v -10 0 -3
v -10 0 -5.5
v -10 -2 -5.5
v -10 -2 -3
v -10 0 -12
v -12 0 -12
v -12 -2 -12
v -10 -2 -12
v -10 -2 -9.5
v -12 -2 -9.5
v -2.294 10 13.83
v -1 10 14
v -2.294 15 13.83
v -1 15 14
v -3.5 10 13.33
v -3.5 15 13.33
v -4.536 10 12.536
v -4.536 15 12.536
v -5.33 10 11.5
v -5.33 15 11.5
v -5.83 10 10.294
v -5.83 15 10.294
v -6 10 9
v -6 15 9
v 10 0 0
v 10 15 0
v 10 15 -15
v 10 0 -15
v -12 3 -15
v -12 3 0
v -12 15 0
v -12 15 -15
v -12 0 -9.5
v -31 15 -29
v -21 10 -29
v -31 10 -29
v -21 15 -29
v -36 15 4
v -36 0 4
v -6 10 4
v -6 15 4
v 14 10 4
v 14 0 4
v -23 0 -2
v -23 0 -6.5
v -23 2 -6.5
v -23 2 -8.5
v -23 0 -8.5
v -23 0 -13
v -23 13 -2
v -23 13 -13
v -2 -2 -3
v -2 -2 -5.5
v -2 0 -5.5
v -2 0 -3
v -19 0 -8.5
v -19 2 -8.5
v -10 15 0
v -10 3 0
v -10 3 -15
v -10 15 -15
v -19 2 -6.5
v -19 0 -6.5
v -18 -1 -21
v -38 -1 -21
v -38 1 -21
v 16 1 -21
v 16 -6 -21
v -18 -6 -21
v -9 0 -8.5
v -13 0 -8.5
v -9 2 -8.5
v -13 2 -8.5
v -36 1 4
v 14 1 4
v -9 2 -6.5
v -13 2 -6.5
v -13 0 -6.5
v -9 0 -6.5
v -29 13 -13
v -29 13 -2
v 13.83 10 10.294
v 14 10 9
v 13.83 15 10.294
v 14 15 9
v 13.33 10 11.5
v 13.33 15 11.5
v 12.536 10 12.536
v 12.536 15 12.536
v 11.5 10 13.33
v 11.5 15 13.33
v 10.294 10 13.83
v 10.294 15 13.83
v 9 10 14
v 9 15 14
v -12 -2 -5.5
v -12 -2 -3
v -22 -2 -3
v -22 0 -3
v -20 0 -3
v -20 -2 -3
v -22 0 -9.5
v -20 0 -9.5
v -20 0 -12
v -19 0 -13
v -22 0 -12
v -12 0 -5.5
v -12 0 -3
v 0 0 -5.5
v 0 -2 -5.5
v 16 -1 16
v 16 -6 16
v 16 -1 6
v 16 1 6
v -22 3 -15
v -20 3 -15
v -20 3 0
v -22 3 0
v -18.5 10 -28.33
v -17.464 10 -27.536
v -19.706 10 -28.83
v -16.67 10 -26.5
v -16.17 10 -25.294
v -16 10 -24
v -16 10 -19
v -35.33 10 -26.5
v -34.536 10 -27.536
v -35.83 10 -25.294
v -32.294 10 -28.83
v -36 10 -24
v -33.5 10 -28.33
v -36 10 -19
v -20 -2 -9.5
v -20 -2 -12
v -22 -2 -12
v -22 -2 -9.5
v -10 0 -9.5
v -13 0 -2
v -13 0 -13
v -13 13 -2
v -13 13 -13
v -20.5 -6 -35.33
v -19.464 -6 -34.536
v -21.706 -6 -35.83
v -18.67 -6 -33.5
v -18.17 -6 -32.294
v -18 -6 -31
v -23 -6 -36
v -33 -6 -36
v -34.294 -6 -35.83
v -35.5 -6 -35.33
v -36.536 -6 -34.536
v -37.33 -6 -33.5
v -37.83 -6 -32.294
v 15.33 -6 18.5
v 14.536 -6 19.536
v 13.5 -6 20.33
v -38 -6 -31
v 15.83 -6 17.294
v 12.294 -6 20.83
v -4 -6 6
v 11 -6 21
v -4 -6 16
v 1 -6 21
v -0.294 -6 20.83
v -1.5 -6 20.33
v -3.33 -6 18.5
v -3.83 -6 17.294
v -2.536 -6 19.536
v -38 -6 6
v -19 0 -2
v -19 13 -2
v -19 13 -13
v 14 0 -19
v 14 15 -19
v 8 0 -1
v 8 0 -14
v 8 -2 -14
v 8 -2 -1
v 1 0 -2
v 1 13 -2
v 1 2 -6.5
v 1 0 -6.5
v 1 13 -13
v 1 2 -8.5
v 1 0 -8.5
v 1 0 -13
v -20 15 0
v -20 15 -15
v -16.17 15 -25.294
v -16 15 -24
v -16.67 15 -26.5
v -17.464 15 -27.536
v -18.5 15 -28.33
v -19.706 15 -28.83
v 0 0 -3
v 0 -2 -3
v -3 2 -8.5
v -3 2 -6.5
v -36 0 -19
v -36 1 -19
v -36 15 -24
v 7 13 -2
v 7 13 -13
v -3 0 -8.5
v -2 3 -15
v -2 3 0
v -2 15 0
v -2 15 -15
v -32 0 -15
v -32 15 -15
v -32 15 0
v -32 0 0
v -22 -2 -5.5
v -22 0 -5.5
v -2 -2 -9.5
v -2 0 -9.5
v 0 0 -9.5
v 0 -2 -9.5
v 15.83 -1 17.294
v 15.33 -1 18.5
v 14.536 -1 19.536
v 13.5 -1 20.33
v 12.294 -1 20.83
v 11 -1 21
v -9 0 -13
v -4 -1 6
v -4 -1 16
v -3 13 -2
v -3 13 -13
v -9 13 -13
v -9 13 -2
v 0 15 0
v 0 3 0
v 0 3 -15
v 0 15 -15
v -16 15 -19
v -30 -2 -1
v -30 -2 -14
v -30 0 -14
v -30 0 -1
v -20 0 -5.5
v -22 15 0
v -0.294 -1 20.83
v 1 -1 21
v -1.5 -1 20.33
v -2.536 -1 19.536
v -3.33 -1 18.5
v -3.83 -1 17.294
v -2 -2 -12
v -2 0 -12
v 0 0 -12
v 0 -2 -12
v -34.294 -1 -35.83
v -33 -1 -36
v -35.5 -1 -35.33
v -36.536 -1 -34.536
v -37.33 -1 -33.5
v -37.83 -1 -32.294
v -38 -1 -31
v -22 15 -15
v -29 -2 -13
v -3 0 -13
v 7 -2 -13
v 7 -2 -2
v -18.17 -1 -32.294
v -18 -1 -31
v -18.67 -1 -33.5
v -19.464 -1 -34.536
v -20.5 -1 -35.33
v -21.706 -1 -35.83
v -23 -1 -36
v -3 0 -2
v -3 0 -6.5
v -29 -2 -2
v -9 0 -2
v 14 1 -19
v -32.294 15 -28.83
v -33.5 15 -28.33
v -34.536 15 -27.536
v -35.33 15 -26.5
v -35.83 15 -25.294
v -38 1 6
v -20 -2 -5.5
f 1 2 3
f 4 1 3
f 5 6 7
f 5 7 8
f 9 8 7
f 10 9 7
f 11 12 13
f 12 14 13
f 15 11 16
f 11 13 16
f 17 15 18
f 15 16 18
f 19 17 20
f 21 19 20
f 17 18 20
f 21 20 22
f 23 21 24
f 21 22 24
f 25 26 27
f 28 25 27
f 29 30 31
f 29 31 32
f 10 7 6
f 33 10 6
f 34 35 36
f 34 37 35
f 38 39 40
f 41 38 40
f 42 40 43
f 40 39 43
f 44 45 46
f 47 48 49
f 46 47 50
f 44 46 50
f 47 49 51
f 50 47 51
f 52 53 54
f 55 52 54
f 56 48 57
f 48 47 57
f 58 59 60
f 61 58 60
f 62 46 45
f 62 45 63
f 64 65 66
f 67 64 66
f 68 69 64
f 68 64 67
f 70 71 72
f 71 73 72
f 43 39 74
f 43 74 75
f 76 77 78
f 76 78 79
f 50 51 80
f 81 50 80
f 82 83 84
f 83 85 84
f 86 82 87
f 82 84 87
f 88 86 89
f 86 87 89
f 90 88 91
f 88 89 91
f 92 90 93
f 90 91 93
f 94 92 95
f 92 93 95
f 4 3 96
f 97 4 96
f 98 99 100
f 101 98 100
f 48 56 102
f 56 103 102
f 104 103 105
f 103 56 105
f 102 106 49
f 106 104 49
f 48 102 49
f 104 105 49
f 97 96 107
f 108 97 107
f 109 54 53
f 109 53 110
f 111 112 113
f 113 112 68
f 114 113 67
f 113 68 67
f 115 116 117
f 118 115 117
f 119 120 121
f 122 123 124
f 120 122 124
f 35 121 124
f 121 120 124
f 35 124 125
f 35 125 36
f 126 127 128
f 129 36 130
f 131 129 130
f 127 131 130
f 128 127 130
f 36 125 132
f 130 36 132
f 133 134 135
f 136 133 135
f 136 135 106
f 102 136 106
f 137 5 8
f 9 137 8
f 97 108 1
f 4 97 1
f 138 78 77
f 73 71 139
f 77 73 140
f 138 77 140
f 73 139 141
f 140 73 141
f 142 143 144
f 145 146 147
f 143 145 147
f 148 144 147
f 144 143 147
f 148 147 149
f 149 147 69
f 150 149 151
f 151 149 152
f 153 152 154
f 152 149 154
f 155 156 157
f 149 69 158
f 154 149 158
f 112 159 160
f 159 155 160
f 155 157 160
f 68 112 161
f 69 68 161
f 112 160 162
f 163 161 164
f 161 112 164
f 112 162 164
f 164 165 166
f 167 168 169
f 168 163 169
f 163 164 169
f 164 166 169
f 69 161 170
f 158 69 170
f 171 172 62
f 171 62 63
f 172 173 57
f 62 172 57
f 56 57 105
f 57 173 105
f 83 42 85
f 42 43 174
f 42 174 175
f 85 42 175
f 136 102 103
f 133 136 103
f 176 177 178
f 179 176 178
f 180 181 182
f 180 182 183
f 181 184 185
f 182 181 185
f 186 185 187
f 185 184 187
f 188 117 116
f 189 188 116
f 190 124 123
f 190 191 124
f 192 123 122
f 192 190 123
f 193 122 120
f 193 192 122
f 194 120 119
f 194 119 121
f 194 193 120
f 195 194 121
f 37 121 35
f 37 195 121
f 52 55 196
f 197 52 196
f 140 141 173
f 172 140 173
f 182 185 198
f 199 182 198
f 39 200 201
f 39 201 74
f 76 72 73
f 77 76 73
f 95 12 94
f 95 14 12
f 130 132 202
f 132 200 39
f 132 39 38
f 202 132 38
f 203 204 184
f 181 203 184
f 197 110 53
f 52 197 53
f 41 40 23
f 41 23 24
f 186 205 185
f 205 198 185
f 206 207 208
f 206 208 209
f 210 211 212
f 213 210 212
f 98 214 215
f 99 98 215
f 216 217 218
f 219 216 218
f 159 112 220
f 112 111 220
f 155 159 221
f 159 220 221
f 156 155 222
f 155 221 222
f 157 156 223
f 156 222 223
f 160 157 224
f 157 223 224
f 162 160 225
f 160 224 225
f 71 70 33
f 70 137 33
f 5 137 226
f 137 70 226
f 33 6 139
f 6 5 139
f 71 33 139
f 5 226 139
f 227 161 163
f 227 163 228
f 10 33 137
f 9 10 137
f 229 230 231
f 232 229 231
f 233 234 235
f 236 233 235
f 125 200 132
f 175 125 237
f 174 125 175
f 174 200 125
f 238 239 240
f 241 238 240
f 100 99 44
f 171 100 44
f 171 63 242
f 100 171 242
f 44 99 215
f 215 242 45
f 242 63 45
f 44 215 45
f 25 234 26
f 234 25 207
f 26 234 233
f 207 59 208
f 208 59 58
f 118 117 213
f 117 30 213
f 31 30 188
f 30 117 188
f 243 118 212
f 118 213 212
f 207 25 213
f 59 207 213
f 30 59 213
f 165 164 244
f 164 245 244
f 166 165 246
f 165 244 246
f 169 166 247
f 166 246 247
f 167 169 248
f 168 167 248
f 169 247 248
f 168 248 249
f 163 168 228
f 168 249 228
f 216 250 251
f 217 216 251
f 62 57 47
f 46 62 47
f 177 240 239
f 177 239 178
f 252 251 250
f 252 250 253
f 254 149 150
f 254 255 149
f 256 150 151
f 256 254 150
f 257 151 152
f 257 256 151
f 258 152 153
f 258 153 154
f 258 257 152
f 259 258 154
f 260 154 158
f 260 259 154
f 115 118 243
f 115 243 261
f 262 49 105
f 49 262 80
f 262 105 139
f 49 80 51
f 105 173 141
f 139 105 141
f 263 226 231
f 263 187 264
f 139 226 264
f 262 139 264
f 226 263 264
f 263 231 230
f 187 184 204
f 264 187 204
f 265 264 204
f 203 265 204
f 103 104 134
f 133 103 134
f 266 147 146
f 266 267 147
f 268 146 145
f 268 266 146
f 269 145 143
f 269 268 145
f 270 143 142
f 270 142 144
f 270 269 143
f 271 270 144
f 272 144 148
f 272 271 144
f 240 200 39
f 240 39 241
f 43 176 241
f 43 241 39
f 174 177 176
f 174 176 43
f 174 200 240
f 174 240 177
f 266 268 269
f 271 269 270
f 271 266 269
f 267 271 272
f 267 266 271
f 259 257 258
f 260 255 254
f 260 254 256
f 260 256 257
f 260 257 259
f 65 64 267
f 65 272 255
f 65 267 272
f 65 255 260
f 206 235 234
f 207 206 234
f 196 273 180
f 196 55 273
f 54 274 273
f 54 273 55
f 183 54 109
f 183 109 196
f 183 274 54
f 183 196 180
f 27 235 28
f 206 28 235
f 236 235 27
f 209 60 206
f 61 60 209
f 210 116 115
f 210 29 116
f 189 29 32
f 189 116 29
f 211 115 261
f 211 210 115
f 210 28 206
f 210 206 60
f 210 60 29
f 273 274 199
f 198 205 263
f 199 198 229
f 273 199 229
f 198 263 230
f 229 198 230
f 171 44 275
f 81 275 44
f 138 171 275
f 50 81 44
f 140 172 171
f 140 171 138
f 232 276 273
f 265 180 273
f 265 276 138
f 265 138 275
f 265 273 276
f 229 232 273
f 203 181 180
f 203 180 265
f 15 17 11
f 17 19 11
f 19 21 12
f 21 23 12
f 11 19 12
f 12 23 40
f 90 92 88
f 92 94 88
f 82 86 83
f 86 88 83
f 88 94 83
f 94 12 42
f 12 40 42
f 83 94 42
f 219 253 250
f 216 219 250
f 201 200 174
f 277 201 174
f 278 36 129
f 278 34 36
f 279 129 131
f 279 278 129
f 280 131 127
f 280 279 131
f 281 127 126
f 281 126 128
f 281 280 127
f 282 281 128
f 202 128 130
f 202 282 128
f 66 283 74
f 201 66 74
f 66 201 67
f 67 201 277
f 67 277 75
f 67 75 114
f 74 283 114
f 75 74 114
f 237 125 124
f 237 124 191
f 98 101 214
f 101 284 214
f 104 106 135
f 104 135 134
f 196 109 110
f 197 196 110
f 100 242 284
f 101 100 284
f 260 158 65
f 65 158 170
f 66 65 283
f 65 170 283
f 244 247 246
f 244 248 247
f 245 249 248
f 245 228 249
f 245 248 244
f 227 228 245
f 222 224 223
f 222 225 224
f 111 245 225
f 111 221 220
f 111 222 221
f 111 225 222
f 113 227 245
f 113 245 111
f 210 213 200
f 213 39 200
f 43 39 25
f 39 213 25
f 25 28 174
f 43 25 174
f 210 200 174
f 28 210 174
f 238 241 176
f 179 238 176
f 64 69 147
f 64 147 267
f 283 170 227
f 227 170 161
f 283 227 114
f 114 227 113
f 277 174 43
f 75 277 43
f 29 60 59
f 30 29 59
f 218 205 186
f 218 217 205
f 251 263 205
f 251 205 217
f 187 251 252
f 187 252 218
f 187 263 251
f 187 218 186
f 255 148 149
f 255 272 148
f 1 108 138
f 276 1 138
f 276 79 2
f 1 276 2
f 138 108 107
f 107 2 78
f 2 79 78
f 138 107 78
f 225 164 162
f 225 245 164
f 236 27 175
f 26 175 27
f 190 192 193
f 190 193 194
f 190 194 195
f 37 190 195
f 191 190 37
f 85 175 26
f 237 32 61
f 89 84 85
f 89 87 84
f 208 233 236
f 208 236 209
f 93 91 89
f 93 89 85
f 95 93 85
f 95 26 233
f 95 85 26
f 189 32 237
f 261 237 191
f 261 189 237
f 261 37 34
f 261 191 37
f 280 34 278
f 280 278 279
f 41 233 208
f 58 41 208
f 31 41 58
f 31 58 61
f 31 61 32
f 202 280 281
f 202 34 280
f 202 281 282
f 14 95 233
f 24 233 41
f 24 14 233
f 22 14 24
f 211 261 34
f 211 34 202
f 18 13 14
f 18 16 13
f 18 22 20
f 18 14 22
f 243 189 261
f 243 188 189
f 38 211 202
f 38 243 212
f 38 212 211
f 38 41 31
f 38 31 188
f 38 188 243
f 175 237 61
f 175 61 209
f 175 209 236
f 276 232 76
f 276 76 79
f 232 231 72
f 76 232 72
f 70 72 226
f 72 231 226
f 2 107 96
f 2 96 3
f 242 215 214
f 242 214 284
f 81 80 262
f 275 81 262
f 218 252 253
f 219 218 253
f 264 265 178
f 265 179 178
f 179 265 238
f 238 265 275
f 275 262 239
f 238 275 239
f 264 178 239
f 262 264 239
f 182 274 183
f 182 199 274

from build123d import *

# Parameters (mm, degrees)
SKETCH1_W                = 8
SKETCH1_H                = 15
BOSS_EXTRUDE1_DEPTH      = 15
SKETCH2_W                = 6
SKETCH2_H                = 11
CUT_EXTRUDE1_DEPTH       = 13
SKETCH3_W                = 15
SKETCH3_H                = 3
BOSS_EXTRUDE2_DEPTH      = 2
LPATTERN1_COUNT          = 4
LPATTERN1_PITCH          = 10
SKETCH4_W                = 15
SKETCH4_H                = 12
BOSS_EXTRUDE3_DEPTH      = 2
SKETCH5_W                = 15
SKETCH5_H                = 15
BOSS_EXTRUDE4_DEPTH      = 2
SKETCH6_W                = 36
SKETCH6_H                = 2
CUT_EXTRUDE2_DEPTH       = 2
SKETCH7_W                = 38
SKETCH7_H                = 13
SKETCH7_W_2              = 36
SKETCH7_H_2              = 11
BOSS_EXTRUDE5_DEPTH      = 2
SKETCH8_W                = 2
SKETCH8_H                = 2.5
BOSS_EXTRUDE6_DEPTH      = 2
LPATTERN2_COUNT          = 3
LPATTERN2_PITCH          = 10
BOSS_EXTRUDE7_DEPTH      = 15
BOSS_EXTRUDE7_DEPTH_BACK = 6
SKETCH9_W                = 50
SKETCH9_H                = 23
SPLIT1_START             = -6
SPLIT1_OUTLINE_W         = 50
SPLIT1_OUTLINE_H         = 23
SPLIT1_DEPTH             = 6
SPLIT1_2_OUTLINE_W       = 6
SPLIT1_2_OUTLINE_H       = 11
SPLIT1_2_DEPTH           = 13
SPLIT1_3_OUTLINE_W       = 4
SPLIT1_3_OUTLINE_H       = 2
SPLIT1_3_DEPTH           = 2
SPLIT1_START_2           = -13
SPLIT1_4_DEPTH           = 11
SPLIT1_START_3           = -19
SPLIT1_5_DEPTH           = 23
SPLIT1_6_OUTLINE_W       = 38
SPLIT1_6_OUTLINE_H       = 2
SPLIT1_6_DEPTH           = 5
SPLIT1_START_4           = -1
SPLIT1_7_OUTLINE_W       = 38
SPLIT1_7_OUTLINE_H       = 2
SPLIT1_7_DEPTH           = 5
SPLIT1_START_5           = -8.5
SPLIT1_8_DEPTH           = 2
SPLIT1_START_6           = -9.5
SPLIT1_9_OUTLINE_W       = 2
SPLIT1_9_OUTLINE_H       = 2
SPLIT1_9_DEPTH           = 4
SPLIT1_10_OUTLINE_W      = 2
SPLIT1_10_OUTLINE_H      = 2
SPLIT1_10_DEPTH          = 1
SPLIT1_START_7           = -3
SPLIT1_11_OUTLINE_W      = 2
SPLIT1_11_OUTLINE_H      = 2
SPLIT1_11_DEPTH          = 1
SKETCH11_W               = 20
SKETCH11_H               = 5
BOSS_EXTRUDE8_DEPTH      = 10
SKETCH12_W               = 20
SKETCH12_H               = 5
BOSS_EXTRUDE9_DEPTH      = 10
FILLET1_R                = 5
SKETCH13_W               = 54
SKETCH13_H               = 27
SKETCH13_W_2             = 50
SKETCH13_H_2             = 23
BOSS_EXTRUDE11_DEPTH     = 7
SKETCH14_W               = 20
SKETCH14_H               = 5
BOSS_EXTRUDE12_DEPTH     = 15
SKETCH15_W               = 20
SKETCH15_H               = 5
BOSS_EXTRUDE13_DEPTH     = 15
FILLET2_R                = 5


# Read off the part's stored shape, not the designer's step: Split1
with BuildPart() as part:
    # Sketch1 → Boss-Extrude1 (new body)
    with BuildSketch(Plane(origin=(0, 0, 0), x_dir=(1, 0, 0), z_dir=(0, 1, 0))):
        with Locations((4, 7.5)):
            Rectangle(SKETCH1_W, SKETCH1_H)
    extrude(amount=BOSS_EXTRUDE1_DEPTH)

    # Sketch2 → Cut-Extrude1 (cut)
    with BuildSketch(Plane.XZ):
        with Locations((4, -7.5)):
            Rectangle(SKETCH2_W, SKETCH2_H)
    extrude(amount=-CUT_EXTRUDE1_DEPTH, mode=Mode.SUBTRACT)

    # Sketch3 → Boss-Extrude2 (add)
    with BuildSketch(Plane.ZY):
        with Locations((-7.5, 1.5)):
            Rectangle(SKETCH3_W, SKETCH3_H)
    extrude(amount=BOSS_EXTRUDE2_DEPTH)


with BuildPart() as lpattern1_1:
    # LPattern1: pattern copy
    add(part.part.moved(Location(Vector(-1, 0, 0) * (1 * LPATTERN1_PITCH))))


with BuildPart() as lpattern1_2:
    # LPattern1: pattern copy
    add(part.part.moved(Location(Vector(-1, 0, 0) * (2 * LPATTERN1_PITCH))))


with BuildPart() as lpattern1_3:
    # LPattern1: pattern copy
    add(part.part.moved(Location(Vector(-1, 0, 0) * (3 * LPATTERN1_PITCH))))


with BuildPart() as lpattern1_2_1:
    add(lpattern1_2.part)

    # Combine1: union LPattern1_1, part, LPattern1_3
    add(lpattern1_1.part)
    add(part.part)
    add(lpattern1_3.part)

    # Sketch4 → Boss-Extrude3 (add)
    with BuildSketch(Plane.ZY.offset(30)):
        with Locations((-7.5, 9)):
            Rectangle(SKETCH4_W, SKETCH4_H)
    extrude(amount=BOSS_EXTRUDE3_DEPTH)

    # Sketch5 → Boss-Extrude4 (add)
    with BuildSketch(Plane(origin=(8, 0, 0), x_dir=(0, 0, -1), z_dir=(1, 0, 0))):
        with Locations((7.5, 7.5)):
            Rectangle(SKETCH5_W, SKETCH5_H)
    extrude(amount=BOSS_EXTRUDE4_DEPTH)

    # Sketch6 → Cut-Extrude2 (cut)
    with BuildSketch(Plane(origin=(0, 0, 0), x_dir=(-1, 0, 0), z_dir=(0, -1, 0))):
        with Locations((11, 7.5)):
            Rectangle(SKETCH6_W, SKETCH6_H)
    extrude(amount=-CUT_EXTRUDE2_DEPTH, mode=Mode.SUBTRACT)

    # Sketch7 → Boss-Extrude5 (add)
    with BuildSketch(Plane.XZ):
        with Locations((-11, -7.5)):
            Rectangle(SKETCH7_W, SKETCH7_H)
        with Locations((-11, -7.5)):
            Rectangle(SKETCH7_W_2, SKETCH7_H_2, mode=Mode.SUBTRACT)
    extrude(amount=BOSS_EXTRUDE5_DEPTH)

    # Sketch8 → Boss-Extrude6 (add)
    with BuildSketch(Plane.XZ):
        with Locations((-21, -10.75)):
            Rectangle(SKETCH8_W, SKETCH8_H)
        with Locations((-21, -4.25)):
            Rectangle(SKETCH8_W, SKETCH8_H)
    boss_extrude6 = extrude(amount=BOSS_EXTRUDE6_DEPTH)

    # LPattern2: Boss-Extrude6 ×3
    with Locations(*[(i * LPATTERN2_PITCH, 0, 0) for i in range(1, LPATTERN2_COUNT)]):
        add(boss_extrude6)


with BuildPart() as body_2:
    # Sketch9 → Boss-Extrude7 (new, two sides: drawn at the far end of the back side and taken through both)
    with BuildSketch(Plane(origin=(0, 0, 0), x_dir=(1, 0, 0), z_dir=(0, 1, 0)).offset(-BOSS_EXTRUDE7_DEPTH_BACK)):
        with Locations((-11, 7.5)):
            Rectangle(SKETCH9_W, SKETCH9_H)
    extrude(amount=BOSS_EXTRUDE7_DEPTH + BOSS_EXTRUDE7_DEPTH_BACK)

    # Combine2: cut LPattern1_2
    add(lpattern1_2_1.part, mode=Mode.SUBTRACT)

    # Split1 outline → Split1 (cut)
    with BuildSketch(Plane(origin=(0, 0, 0), x_dir=(1, 0, 0), z_dir=(0, 1, 0)).offset(SPLIT1_START)):
        with Locations((-11, 7.5)):
            Rectangle(SPLIT1_OUTLINE_W, SPLIT1_OUTLINE_H)
    extrude(amount=SPLIT1_DEPTH, mode=Mode.SUBTRACT)

    # Split1 2 outline → Split1 2 (cut)
    with BuildSketch(Plane(origin=(0, 0, 0), x_dir=(1, 0, 0), z_dir=(0, 1, 0))):
        with Locations((-26, 7.5)):
            Rectangle(SPLIT1_2_OUTLINE_W, SPLIT1_2_OUTLINE_H)
        with Locations((-16, 7.5)):
            Rectangle(SPLIT1_2_OUTLINE_W, SPLIT1_2_OUTLINE_H)
        with Locations((-6, 7.5)):
            Rectangle(SPLIT1_2_OUTLINE_W, SPLIT1_2_OUTLINE_H)
        with Locations((4, 7.5)):
            Rectangle(SPLIT1_2_OUTLINE_W, SPLIT1_2_OUTLINE_H)
    extrude(amount=SPLIT1_2_DEPTH, mode=Mode.SUBTRACT)

    # Split1 3 outline → Split1 3 (cut)
    with BuildSketch(Plane(origin=(0, 0, 0), x_dir=(1, 0, 0), z_dir=(0, 1, 0))):
        with Locations((-21, 7.5)):
            Rectangle(SPLIT1_3_OUTLINE_W, SPLIT1_3_OUTLINE_H)
        with Locations((-11, 7.5)):
            Rectangle(SPLIT1_3_OUTLINE_W, SPLIT1_3_OUTLINE_H)
        with Locations((-1, 7.5)):
            Rectangle(SPLIT1_3_OUTLINE_W, SPLIT1_3_OUTLINE_H)
    extrude(amount=SPLIT1_3_DEPTH, mode=Mode.SUBTRACT)

    # Sketch11 → Boss-Extrude8 (add)
    with BuildSketch(Plane.XY.offset(4)):
        with Locations((4, 12.5)):
            Rectangle(SKETCH11_W, SKETCH11_H)
    extrude(amount=BOSS_EXTRUDE8_DEPTH)

    # Sketch12 → Boss-Extrude9 (add)
    with BuildSketch(Plane(origin=(0, 0, -19), x_dir=(-1, 0, 0), z_dir=(0, 0, -1))):
        with Locations((26, 12.5)):
            Rectangle(SKETCH12_W, SKETCH12_H)
    extrude(amount=BOSS_EXTRUDE9_DEPTH)

    # Fillet1
    fillet1_edges = [body_2.edges().sort_by_distance(p)[0] for p in [
        (-6, 12.5, 14),
        (14, 12.5, 14),
        (-36, 12.5, -29),
        (-16, 12.5, -29),
    ]]
    fillet(fillet1_edges, radius=FILLET1_R)


with BuildPart() as body_2_2:
    # Split1 4 outline → Split1 4 (new body)
    with BuildSketch(Plane.XY.offset(SPLIT1_START_2)):
        Polygon((1, 13), (1, 0), (0, 0), (0, -2), (-2, -2), (-2, 0), (-3, 0), (-3, 13), (-9, 13), (-9, 0), (-10, 0), (-10, -2), (-12, -2), (-12, 0), (-13, 0), (-13, 13), (-19, 13), (-19, 0), (-20, 0), (-20, -2), (-22, -2), (-22, 0), (-23, 0), (-23, 13), (-29, 13), (-29, -2), (-30, -2), (-30, 0), (-36, 0), (-36, -6), (14, -6), (14, 0), (8, 0), (8, -2), (7, -2), (7, 13), align=None)
    extrude(amount=SPLIT1_4_DEPTH)

    # Split1 5 outline → Split1 5 (add)
    with BuildSketch(Plane.XY.offset(SPLIT1_START_3)):
        Polygon((8, -2), (-30, -2), (-30, 0), (-36, 0), (-36, -6), (14, -6), (14, 0), (8, 0), align=None)
    extrude(amount=SPLIT1_5_DEPTH)

    # Split1 6 outline → Split1 6 (add)
    with BuildSketch(Plane.XY.offset(SPLIT1_START_3)):
        with Locations((-11, -1)):
            Rectangle(SPLIT1_6_OUTLINE_W, SPLIT1_6_OUTLINE_H)
    extrude(amount=SPLIT1_6_DEPTH)

    # Split1 7 outline → Split1 7 (add)
    with BuildSketch(Plane.XY.offset(SPLIT1_START_4)):
        with Locations((-11, -1)):
            Rectangle(SPLIT1_7_OUTLINE_W, SPLIT1_7_OUTLINE_H)
    extrude(amount=SPLIT1_7_DEPTH)

    # Split1 8 outline → Split1 8 (add)
    with BuildSketch(Plane.XY.offset(SPLIT1_START_5)):
        Polygon((1, 0), (1, 2), (-3, 2), (-3, 0), (-2, 0), (-2, -2), (0, -2), (0, 0), align=None)
        Polygon((-10, 0), (-9, 0), (-9, 2), (-13, 2), (-13, 0), (-12, 0), (-12, -2), (-10, -2), align=None)
        Polygon((-22, -2), (-20, -2), (-20, 0), (-19, 0), (-19, 2), (-23, 2), (-23, 0), (-22, 0), align=None)
    extrude(amount=SPLIT1_8_DEPTH)

    # Split1 9 outline → Split1 9 (add)
    with BuildSketch(Plane.XY.offset(SPLIT1_START_6)):
        with Locations((-1, -1)):
            Rectangle(SPLIT1_9_OUTLINE_W, SPLIT1_9_OUTLINE_H)
        with Locations((-11, -1)):
            Rectangle(SPLIT1_9_OUTLINE_W, SPLIT1_9_OUTLINE_H)
        with Locations((-21, -1)):
            Rectangle(SPLIT1_9_OUTLINE_W, SPLIT1_9_OUTLINE_H)
    extrude(amount=SPLIT1_9_DEPTH)

    # Split1 10 outline → Split1 10 (add)
    with BuildSketch(Plane.XY.offset(SPLIT1_START_2)):
        with Locations((-1, -1)):
            Rectangle(SPLIT1_10_OUTLINE_W, SPLIT1_10_OUTLINE_H)
        with Locations((-11, -1)):
            Rectangle(SPLIT1_10_OUTLINE_W, SPLIT1_10_OUTLINE_H)
        with Locations((-21, -1)):
            Rectangle(SPLIT1_10_OUTLINE_W, SPLIT1_10_OUTLINE_H)
    extrude(amount=SPLIT1_10_DEPTH)

    # Split1 11 outline → Split1 11 (add)
    with BuildSketch(Plane.XY.offset(SPLIT1_START_7)):
        with Locations((-1, -1)):
            Rectangle(SPLIT1_11_OUTLINE_W, SPLIT1_11_OUTLINE_H)
        with Locations((-11, -1)):
            Rectangle(SPLIT1_11_OUTLINE_W, SPLIT1_11_OUTLINE_H)
        with Locations((-21, -1)):
            Rectangle(SPLIT1_11_OUTLINE_W, SPLIT1_11_OUTLINE_H)
    extrude(amount=SPLIT1_11_DEPTH)

    # Sketch13 → Boss-Extrude11 (add)
    with BuildSketch(Plane.XZ.offset(6)):
        with Locations((-11, -7.5)):
            Rectangle(SKETCH13_W, SKETCH13_H)
        with Locations((-11, -7.5)):
            Rectangle(SKETCH13_W_2, SKETCH13_H_2, mode=Mode.SUBTRACT)
    extrude(amount=-BOSS_EXTRUDE11_DEPTH)

    # Sketch14 → Boss-Extrude12 (add)
    with BuildSketch(Plane.XY.offset(6)):
        with Locations((6, -3.5)):
            Rectangle(SKETCH14_W, SKETCH14_H)
    extrude(amount=BOSS_EXTRUDE12_DEPTH)

    # Sketch15 → Boss-Extrude13 (add)
    with BuildSketch(Plane(origin=(0, 0, -21), x_dir=(-1, 0, 0), z_dir=(0, 0, -1))):
        with Locations((28, -3.5)):
            Rectangle(SKETCH15_W, SKETCH15_H)
    extrude(amount=BOSS_EXTRUDE13_DEPTH)

    # Fillet2
    fillet2_edges = [body_2_2.edges().sort_by_distance(p)[0] for p in [
        (16, -3.5, 21),
        (-4, -3.5, 21),
        (-38, -3.5, -36),
        (-18, -3.5, -36),
    ]]
    fillet(fillet2_edges, radius=FILLET2_R)


solid = Compound([body_2.part, body_2_2.part])
